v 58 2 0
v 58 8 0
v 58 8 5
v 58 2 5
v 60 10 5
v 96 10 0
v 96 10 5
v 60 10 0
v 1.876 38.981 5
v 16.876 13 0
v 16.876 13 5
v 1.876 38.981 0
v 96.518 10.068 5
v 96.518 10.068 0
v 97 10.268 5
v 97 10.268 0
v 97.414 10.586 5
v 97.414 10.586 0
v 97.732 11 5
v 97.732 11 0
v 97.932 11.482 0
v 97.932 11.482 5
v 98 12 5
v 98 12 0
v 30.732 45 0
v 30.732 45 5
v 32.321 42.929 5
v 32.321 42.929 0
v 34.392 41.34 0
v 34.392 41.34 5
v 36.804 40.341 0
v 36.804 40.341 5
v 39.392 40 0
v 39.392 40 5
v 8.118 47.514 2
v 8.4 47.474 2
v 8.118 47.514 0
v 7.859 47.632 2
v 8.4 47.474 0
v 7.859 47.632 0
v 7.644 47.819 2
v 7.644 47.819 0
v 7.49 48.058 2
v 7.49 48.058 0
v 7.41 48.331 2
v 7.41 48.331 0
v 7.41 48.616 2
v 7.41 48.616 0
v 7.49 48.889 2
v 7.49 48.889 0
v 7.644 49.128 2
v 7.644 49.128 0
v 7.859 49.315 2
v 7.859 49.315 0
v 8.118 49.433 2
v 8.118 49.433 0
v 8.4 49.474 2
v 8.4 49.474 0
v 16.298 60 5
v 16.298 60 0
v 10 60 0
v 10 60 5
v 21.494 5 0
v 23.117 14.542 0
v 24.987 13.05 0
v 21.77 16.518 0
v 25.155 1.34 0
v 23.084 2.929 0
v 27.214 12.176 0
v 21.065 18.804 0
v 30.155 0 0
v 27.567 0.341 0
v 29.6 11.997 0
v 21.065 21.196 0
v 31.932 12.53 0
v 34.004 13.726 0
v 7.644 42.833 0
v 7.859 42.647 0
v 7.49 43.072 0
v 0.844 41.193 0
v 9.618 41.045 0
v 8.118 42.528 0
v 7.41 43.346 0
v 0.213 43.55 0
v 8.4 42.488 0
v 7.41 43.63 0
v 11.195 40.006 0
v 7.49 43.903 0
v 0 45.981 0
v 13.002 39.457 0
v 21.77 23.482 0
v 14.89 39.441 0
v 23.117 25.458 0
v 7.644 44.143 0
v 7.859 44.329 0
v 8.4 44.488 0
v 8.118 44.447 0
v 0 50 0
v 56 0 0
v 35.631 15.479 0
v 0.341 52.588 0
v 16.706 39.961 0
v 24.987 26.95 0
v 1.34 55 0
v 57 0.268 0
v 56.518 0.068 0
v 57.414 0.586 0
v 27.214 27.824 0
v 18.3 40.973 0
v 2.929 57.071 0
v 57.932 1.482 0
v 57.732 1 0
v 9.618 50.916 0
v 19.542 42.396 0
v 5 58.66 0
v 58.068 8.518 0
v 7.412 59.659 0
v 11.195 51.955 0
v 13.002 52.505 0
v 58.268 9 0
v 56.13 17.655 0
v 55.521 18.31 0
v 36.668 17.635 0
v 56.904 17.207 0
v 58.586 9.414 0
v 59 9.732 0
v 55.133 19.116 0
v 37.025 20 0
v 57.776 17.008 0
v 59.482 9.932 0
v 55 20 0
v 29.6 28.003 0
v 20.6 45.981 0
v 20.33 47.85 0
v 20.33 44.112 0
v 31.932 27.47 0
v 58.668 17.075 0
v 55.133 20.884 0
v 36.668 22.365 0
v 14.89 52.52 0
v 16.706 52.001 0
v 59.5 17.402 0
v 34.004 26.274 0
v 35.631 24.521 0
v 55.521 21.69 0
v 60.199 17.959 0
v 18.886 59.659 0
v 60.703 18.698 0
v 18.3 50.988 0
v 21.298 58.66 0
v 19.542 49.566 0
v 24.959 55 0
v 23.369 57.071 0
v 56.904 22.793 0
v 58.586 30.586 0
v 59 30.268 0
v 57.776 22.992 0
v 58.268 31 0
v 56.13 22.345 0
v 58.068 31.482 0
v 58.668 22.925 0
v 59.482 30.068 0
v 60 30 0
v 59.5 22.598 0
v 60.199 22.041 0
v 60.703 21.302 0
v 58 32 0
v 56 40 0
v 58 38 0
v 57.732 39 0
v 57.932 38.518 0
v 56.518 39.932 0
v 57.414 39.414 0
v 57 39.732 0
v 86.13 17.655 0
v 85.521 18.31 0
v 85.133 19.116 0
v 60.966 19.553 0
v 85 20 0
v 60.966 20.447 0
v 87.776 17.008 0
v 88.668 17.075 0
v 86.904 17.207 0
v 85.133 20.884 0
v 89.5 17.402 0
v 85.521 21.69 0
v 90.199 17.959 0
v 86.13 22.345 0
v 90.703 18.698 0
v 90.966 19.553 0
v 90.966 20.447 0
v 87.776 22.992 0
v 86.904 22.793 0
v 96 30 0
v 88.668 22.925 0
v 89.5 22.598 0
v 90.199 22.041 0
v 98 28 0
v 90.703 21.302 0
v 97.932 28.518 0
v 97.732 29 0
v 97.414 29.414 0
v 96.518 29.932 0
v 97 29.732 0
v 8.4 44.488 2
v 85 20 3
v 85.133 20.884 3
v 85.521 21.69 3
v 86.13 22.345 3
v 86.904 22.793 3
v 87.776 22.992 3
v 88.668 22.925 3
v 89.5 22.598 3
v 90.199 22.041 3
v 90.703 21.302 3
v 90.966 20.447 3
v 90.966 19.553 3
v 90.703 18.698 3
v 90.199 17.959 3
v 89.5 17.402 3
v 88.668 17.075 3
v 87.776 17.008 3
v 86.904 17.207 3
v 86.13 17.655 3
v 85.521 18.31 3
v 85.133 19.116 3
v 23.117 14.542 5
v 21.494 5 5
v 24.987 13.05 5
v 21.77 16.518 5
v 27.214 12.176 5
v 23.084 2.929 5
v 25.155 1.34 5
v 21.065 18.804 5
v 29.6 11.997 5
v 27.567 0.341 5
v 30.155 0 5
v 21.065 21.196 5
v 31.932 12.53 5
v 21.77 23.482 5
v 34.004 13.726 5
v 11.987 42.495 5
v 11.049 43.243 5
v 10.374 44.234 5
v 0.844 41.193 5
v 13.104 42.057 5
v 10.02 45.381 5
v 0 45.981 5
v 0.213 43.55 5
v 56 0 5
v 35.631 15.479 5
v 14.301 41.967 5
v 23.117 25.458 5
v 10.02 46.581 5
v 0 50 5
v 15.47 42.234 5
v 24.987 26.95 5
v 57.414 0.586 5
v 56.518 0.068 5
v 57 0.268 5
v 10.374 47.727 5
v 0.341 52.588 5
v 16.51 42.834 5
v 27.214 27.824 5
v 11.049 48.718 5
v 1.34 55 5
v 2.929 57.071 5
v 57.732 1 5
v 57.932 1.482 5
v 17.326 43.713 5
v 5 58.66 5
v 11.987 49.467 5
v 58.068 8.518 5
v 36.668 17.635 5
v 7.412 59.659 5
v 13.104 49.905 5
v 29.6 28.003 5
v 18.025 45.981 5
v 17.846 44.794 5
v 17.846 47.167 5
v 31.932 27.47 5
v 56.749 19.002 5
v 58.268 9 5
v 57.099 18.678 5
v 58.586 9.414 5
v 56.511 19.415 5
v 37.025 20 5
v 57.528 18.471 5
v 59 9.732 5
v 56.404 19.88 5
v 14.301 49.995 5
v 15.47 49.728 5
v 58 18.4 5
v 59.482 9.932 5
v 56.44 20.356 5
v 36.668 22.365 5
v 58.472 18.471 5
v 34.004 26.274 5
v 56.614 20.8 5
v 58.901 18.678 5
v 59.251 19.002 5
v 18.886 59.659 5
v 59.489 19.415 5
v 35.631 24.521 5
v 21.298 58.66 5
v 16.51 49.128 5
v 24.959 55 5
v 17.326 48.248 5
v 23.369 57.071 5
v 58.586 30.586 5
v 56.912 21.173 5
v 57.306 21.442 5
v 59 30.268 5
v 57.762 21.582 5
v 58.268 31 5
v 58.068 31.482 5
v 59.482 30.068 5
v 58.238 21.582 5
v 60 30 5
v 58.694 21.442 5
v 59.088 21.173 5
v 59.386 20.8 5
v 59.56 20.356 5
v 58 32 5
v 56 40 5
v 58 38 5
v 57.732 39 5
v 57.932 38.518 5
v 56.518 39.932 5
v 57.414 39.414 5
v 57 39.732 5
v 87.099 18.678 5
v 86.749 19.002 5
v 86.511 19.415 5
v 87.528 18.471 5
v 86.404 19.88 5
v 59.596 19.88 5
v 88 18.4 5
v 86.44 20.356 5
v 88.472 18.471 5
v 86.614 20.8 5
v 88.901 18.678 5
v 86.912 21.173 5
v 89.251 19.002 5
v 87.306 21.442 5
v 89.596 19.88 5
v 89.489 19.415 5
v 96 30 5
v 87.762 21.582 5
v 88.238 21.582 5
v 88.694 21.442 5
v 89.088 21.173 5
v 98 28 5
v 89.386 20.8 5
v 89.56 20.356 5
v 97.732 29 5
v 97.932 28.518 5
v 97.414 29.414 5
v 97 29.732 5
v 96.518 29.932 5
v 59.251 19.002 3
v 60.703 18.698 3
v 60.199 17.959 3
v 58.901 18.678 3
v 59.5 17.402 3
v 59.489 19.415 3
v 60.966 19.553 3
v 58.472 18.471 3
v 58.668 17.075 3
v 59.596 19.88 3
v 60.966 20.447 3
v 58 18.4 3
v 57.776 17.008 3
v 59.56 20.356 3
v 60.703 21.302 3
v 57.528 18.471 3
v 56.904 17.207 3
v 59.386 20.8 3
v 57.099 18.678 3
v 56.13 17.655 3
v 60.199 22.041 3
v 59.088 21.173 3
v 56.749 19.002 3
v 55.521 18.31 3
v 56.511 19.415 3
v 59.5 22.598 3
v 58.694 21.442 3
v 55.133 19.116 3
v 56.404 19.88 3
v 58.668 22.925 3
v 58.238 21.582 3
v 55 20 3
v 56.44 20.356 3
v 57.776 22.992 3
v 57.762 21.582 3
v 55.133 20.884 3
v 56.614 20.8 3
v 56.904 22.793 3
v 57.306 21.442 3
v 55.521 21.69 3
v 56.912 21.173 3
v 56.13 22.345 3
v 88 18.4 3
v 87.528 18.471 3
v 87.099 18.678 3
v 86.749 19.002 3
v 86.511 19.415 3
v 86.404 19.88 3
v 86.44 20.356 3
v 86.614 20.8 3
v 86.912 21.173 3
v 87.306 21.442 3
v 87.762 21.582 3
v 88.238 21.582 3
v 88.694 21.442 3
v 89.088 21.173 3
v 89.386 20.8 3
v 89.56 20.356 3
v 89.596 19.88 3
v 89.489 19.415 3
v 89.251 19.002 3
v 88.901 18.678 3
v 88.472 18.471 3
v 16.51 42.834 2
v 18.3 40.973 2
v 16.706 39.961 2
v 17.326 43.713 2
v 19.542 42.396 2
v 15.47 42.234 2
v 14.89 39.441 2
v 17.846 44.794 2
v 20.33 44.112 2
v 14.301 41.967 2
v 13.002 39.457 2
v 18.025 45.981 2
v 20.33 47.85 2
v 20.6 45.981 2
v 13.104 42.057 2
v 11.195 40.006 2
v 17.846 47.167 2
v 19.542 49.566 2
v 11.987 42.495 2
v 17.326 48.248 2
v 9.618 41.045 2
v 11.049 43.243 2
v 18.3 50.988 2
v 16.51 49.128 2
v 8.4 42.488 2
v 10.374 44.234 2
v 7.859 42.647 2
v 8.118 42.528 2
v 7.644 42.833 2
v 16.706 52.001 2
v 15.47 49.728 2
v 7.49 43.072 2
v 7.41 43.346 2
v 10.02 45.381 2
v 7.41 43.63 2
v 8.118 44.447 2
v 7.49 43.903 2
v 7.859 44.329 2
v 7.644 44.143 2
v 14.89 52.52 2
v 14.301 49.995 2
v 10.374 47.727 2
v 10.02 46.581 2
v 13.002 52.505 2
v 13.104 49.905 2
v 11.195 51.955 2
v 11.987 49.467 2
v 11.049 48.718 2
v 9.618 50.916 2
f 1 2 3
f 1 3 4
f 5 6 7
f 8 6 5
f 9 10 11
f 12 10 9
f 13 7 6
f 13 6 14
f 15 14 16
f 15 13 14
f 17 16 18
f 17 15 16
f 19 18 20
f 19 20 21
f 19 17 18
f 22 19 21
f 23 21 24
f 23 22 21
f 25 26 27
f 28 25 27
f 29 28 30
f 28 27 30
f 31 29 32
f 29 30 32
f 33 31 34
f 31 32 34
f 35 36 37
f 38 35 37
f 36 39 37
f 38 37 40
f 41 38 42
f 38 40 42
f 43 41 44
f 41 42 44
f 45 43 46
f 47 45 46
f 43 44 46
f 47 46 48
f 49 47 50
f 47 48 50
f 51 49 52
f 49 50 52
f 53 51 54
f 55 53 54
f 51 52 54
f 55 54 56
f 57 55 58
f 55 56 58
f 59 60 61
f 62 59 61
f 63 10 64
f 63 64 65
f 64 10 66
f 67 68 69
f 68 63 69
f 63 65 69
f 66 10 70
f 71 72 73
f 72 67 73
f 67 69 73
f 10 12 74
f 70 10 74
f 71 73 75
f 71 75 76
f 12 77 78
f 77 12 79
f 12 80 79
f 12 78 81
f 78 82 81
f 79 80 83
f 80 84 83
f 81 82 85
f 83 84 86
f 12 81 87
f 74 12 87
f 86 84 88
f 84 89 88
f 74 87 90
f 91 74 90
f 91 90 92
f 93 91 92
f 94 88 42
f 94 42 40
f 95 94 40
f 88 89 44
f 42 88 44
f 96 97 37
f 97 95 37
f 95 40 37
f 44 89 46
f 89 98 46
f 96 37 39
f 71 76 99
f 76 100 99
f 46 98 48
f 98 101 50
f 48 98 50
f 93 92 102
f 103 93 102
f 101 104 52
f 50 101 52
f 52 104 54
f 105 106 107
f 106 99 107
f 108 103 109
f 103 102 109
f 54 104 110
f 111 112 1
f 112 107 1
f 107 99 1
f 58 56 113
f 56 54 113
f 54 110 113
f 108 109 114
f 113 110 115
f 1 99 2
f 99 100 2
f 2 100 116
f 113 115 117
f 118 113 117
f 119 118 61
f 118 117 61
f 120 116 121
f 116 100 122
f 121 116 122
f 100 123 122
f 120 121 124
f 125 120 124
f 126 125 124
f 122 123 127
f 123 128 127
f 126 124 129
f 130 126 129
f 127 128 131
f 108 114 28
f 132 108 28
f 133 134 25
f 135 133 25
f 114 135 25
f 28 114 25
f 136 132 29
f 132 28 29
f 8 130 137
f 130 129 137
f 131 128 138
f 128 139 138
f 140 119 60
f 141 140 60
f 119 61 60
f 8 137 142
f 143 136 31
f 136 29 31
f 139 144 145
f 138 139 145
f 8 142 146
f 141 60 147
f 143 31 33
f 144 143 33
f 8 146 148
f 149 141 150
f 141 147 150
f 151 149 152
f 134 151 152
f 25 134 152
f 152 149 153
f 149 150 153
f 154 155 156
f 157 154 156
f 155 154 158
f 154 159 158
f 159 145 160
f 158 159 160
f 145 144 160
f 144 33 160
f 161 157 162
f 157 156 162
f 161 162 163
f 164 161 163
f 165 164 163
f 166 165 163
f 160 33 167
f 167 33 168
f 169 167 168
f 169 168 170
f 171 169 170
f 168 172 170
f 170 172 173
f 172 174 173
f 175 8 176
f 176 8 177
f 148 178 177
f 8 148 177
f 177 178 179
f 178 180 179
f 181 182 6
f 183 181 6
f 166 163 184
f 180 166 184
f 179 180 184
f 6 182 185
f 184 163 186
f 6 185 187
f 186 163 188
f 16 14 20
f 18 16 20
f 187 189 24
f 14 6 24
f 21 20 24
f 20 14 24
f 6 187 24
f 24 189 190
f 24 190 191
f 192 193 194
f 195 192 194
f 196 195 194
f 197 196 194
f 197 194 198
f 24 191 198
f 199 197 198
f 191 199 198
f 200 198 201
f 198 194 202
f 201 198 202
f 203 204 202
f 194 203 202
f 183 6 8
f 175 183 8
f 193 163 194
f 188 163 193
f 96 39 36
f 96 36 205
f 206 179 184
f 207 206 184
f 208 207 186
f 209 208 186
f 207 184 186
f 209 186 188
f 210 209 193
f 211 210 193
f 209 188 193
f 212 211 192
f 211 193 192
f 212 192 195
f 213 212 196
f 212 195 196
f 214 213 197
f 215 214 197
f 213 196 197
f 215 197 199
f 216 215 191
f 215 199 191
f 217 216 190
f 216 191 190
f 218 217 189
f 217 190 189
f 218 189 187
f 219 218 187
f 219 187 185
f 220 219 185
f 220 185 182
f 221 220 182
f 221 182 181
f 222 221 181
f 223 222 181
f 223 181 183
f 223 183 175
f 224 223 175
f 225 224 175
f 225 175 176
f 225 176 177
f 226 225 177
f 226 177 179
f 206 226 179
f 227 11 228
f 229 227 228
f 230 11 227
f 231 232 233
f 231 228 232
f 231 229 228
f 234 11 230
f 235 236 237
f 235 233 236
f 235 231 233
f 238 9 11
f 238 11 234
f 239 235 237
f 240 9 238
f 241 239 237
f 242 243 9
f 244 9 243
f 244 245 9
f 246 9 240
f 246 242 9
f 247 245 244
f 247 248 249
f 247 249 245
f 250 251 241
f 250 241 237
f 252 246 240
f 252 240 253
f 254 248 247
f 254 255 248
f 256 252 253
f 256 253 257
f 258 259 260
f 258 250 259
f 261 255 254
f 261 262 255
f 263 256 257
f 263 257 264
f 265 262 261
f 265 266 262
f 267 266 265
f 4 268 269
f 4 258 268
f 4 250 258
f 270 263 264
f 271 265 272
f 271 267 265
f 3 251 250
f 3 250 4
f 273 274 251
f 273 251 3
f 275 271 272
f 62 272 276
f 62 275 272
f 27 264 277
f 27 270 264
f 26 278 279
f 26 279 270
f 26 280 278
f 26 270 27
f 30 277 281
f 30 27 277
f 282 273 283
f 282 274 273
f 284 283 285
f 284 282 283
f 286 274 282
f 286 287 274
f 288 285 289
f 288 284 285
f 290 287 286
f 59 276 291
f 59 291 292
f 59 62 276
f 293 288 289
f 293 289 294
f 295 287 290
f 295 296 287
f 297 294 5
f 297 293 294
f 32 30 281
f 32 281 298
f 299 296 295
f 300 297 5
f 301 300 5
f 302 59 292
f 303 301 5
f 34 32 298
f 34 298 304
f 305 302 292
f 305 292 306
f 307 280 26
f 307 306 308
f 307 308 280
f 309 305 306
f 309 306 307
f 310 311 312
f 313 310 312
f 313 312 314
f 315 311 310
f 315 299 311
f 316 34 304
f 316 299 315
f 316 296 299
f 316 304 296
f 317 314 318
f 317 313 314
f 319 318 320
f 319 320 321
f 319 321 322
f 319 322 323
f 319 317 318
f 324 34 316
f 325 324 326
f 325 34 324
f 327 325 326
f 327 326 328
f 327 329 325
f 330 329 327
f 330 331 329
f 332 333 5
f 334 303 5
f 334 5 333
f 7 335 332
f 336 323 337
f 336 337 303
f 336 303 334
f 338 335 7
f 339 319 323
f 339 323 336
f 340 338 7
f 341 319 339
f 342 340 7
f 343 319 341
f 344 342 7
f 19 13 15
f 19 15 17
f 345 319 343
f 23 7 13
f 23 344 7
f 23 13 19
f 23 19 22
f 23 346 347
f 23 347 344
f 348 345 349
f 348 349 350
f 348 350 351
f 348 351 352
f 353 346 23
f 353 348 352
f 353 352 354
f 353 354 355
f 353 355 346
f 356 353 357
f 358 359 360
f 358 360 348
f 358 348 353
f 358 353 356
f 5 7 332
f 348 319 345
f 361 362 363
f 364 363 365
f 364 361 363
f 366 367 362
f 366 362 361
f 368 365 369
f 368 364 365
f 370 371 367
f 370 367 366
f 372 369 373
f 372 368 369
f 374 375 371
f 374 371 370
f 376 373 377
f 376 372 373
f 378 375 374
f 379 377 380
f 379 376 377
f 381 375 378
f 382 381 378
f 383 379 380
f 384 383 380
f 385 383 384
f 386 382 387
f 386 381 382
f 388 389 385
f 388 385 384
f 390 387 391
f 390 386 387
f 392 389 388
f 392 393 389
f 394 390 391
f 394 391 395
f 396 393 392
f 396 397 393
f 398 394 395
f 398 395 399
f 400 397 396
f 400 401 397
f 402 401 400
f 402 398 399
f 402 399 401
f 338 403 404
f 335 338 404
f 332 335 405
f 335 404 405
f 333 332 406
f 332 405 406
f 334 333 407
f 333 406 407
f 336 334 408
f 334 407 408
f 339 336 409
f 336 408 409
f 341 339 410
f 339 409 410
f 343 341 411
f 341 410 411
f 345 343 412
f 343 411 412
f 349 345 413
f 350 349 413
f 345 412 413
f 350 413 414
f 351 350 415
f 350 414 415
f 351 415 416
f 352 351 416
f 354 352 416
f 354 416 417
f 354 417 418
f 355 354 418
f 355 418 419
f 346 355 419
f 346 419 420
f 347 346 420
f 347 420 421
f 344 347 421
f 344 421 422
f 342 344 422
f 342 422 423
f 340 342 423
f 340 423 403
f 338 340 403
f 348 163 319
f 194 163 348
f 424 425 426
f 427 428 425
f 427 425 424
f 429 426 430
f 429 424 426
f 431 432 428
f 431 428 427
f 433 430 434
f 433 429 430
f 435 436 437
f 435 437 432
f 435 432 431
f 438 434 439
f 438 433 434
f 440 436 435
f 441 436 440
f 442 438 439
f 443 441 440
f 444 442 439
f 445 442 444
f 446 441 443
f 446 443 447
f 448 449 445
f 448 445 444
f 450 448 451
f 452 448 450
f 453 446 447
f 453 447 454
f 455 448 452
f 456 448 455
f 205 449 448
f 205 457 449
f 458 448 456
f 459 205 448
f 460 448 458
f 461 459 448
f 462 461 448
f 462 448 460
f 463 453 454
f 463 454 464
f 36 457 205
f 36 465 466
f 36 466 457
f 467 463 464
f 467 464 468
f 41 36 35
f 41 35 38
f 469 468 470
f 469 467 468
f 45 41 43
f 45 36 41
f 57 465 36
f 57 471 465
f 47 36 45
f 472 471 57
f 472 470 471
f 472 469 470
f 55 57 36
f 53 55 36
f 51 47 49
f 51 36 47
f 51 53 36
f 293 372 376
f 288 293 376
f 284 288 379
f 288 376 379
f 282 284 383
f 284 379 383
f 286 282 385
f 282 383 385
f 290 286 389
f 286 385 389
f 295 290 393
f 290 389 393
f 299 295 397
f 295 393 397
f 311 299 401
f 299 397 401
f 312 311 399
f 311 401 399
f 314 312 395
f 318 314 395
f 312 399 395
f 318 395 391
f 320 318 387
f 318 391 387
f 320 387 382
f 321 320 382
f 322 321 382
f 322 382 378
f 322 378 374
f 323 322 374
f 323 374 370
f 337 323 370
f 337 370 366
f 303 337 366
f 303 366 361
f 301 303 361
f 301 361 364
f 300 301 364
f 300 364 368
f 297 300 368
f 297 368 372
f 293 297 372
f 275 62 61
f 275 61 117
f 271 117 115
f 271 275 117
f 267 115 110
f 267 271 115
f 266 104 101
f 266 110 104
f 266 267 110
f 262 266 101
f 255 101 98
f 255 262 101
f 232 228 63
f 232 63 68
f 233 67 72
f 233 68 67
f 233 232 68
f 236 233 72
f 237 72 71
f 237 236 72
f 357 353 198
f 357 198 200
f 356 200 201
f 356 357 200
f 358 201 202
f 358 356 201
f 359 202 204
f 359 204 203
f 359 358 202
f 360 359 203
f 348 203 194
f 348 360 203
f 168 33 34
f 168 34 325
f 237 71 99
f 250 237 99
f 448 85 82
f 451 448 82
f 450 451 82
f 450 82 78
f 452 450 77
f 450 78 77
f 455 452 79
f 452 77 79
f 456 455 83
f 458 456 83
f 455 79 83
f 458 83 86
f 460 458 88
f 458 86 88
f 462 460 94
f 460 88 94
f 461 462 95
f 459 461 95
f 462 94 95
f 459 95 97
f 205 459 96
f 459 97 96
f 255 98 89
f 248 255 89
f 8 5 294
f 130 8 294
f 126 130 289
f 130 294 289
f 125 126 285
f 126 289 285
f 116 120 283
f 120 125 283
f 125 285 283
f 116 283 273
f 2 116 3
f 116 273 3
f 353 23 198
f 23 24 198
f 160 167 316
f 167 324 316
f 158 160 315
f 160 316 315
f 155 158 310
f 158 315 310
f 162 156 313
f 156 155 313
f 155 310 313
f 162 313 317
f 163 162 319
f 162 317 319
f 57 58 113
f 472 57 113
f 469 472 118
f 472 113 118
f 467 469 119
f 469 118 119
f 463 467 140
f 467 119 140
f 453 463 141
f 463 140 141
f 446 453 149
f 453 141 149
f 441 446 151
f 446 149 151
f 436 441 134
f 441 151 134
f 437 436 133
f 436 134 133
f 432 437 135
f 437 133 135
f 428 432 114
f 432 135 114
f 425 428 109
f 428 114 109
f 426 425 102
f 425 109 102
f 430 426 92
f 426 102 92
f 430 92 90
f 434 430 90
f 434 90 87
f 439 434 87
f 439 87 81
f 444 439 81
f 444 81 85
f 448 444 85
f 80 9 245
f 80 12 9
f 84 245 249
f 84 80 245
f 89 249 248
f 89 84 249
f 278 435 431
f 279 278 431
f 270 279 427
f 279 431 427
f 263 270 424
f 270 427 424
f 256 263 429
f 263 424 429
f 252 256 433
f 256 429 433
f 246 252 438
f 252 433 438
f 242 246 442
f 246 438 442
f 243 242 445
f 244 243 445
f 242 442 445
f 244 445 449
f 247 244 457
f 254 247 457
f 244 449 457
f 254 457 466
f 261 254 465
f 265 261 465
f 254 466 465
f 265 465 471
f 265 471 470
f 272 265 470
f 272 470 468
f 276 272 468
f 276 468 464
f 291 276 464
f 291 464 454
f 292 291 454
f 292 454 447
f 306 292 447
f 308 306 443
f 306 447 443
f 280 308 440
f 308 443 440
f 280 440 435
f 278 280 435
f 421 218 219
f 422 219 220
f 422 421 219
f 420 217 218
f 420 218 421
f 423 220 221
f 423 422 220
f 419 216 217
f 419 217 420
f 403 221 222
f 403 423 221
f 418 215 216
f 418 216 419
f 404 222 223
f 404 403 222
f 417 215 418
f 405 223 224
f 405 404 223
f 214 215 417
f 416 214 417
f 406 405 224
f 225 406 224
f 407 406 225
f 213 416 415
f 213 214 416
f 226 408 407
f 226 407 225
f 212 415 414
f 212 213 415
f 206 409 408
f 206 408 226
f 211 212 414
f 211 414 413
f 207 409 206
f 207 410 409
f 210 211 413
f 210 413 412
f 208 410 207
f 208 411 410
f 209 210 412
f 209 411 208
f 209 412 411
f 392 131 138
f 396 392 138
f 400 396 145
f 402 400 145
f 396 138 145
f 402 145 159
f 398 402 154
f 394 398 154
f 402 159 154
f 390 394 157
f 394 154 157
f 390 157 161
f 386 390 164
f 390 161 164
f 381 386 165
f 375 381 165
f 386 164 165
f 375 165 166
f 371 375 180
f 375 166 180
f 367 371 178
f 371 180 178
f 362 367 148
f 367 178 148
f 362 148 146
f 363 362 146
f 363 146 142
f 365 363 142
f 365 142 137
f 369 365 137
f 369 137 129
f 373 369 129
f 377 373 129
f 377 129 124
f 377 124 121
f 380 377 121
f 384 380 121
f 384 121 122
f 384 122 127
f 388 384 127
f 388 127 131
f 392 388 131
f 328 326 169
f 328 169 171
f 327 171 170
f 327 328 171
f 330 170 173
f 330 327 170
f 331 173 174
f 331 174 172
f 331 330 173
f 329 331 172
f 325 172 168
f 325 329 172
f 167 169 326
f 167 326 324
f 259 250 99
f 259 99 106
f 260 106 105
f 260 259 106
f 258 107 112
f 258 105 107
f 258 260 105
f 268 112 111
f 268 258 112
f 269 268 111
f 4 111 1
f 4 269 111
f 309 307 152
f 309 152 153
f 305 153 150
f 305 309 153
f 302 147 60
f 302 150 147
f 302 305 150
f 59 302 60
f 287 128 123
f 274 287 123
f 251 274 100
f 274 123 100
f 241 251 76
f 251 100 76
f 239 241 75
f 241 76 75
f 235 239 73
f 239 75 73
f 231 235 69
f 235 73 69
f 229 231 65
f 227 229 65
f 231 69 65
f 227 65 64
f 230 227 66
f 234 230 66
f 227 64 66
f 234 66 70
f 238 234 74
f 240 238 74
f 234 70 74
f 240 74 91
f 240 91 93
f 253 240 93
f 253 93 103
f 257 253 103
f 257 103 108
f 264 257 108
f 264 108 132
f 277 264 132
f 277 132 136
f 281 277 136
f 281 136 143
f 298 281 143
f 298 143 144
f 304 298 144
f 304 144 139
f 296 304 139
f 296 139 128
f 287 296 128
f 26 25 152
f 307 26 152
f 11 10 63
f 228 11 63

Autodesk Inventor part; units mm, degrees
ref_plane "YZ Plane" through (0, 0, 0) normal (1, 0, 0) x (0, 1, 0)
ref_plane "XZ Plane" through (0, 0, 0) normal (0, 1, 0) x (-1, 0, 0)
ref_plane "XY Plane" through (0, 0, 0) normal (0, 0, 1) x (1, 0, 0)
sketch "スケッチ1" plane through (0, 0, 0) normal (0, 0, 1) x (1, 0, 0)
  line L0 (0, 0) -> (98, 0)
  line L1 (98, 0) -> (98, 60)
  line L2 (98, 60) -> (0, 60)
  line L3 (0, 60) -> (0, 0)
  line L4 (98, 0) -> (29, 0)
  line L5 (29, 0) -> (29, 40)
  line L6 (29, 40) -> (98, 40)
  line L7 (98, 40) -> (98, 0)
  line L8 (29, 30) -> (98, 30)
  line L9 (98, 30) -> (98, 10)
  line L10 (98, 10) -> (29, 10)
  line L11 (29, 10) -> (29, 30)
  line L12 (98, 20) -> (0, 20)
  line L13 (29, 20) -> (5.906, 60)
  circle A0 centre (29, 20) radius 8.025
  circle A1 centre (14, 45.9808) radius 4.025
  line L14 (58, 40) -> (58, 0)
  line L15 (16.8756, 13) -> (-6.2184, 53)
  line L16 (41.1244, 27) -> (18.0303, 67)
  circle A2 centre (14, 45.9808) radius 14
  line L17 (16.8756, 13) -> (25.3526, -1.6825)
  point P0 (58, 30)
  point P1 (33.6188, 40)
  point P2 (22.0718, 60)
  point P3 (0, 45.9808)
  point P4 (1.8756, 38.9808)
  point P5 (24.3812, 0)
  point P6 (58, 0)
  point P7 (58, 10)
  dimension "d0" = 98
  dimension "d1" = 60
  dimension "d2" = 40
  dimension "d3" = 20
  dimension "d4" = 10
  dimension "d5" = 69
  dimension "d6" = 30
  dimension "d7" = 16.05
  dimension "d8" = 30
  dimension "d9" = 8.05
  dimension "d10" = 40
  dimension "d11" = 28
extrude "押し出し1" add sketch "スケッチ1" along normal blind 5 contours L5 L10 L14 L0 | L0 L17 L15 L12 A0 L5 | L5 A0 L12 L14 L10 | L14 L12 L1 L10 | L14 L8 L1 L12 | L12 A0 L5 L8 L14 | L15 A2 L13 A0 L12 | L8 L16 L6 L14 | A2 L13 A1 | A0 L13 A2 L16 L6 L5 | L8 L5 L6 L16 | L3 L2 L13 A2 | L13 A1 A2 | L13 L2 L16 A2
sketch "スケッチ2" plane through (0, 0, 5) normal (0, 0, 1) x (1, 0, 0)
  line L0 (98, 10) -> (98, 30) projected
  line L1 (98, 20) -> (47.1161, 20)
  point P0 (0, 0)
  point P1 (88, 20)
  point P2 (58, 20)
  dimension "d14" = 10
  dimension "d15" = 30
hole "穴1" at (88, 20, 5) at (58, 20, 5) direction (0, 0, -1) diameter 3.2 depth 10
fillet "フィレット1" radius 2 6 edges at (58, 40, 2.5) (58, 30, 2.5) (98, 30, 2.5) (98, 10, 2.5) (58, 0, 2.5) (58, 10, 2.5)
fillet "フィレット2" radius 10 4 edges at (24.3812, 0, 2.5) (0, 60, 2.5) (22.0718, 60, 2.5) (33.6188, 40, 2.5)
sketch "スケッチ5" plane through (0, 0, 0) normal (0, 0, -1) x (-1, 0, 0)
  circle A0 centre (-88, 20) radius 1.6 projected
  circle A1 centre (-88, 20) radius 3
  circle A2 centre (-58, 20) radius 1.6 projected
  circle A3 centre (-58, 20) radius 3
  point P0 (0, 0)
  dimension "d38" = 6
  dimension "d39" = 6
extrude "押し出し3" cut sketch "スケッチ5" against normal blind 3 contours A0 | A1 | A2 | A3
sketch "スケッチ6" plane through (0, 0, 0) normal (0, 0, -1) x (-1, 0, 0)
  circle A0 centre (-14, 45.9808) radius 4.025 projected
  circle A1 centre (-14, 45.9808) radius 6.6
  line L0 (-8.4, 49.4736) -> (-8.4, 42.4879)
  arc A2 (-8.4, 47.4736) -> (-8.4, 49.4736) centre (-8.4, 48.4736) ccw
  arc A3 (-8.4, 42.4879) -> (-8.4, 44.4879) centre (-8.4, 43.4879) ccw
  point P0 (0, 0)
  dimension "d42" = 13.2
  dimension "d45" = 5.6
  dimension "d46" = 1
  dimension "d47" = 0
  dimension "d48" = 0
  dimension "d49" = 1
extrude "押し出し4" cut sketch "スケッチ6" against normal blind 2 contours L0 A1 | A2 A1 | A1 A2 L0 | L0 A3 A1 | A1 A3
equation "\"d49\" = d46"
properties part number "RP_Calf-Link-cover-Inside-Right"
